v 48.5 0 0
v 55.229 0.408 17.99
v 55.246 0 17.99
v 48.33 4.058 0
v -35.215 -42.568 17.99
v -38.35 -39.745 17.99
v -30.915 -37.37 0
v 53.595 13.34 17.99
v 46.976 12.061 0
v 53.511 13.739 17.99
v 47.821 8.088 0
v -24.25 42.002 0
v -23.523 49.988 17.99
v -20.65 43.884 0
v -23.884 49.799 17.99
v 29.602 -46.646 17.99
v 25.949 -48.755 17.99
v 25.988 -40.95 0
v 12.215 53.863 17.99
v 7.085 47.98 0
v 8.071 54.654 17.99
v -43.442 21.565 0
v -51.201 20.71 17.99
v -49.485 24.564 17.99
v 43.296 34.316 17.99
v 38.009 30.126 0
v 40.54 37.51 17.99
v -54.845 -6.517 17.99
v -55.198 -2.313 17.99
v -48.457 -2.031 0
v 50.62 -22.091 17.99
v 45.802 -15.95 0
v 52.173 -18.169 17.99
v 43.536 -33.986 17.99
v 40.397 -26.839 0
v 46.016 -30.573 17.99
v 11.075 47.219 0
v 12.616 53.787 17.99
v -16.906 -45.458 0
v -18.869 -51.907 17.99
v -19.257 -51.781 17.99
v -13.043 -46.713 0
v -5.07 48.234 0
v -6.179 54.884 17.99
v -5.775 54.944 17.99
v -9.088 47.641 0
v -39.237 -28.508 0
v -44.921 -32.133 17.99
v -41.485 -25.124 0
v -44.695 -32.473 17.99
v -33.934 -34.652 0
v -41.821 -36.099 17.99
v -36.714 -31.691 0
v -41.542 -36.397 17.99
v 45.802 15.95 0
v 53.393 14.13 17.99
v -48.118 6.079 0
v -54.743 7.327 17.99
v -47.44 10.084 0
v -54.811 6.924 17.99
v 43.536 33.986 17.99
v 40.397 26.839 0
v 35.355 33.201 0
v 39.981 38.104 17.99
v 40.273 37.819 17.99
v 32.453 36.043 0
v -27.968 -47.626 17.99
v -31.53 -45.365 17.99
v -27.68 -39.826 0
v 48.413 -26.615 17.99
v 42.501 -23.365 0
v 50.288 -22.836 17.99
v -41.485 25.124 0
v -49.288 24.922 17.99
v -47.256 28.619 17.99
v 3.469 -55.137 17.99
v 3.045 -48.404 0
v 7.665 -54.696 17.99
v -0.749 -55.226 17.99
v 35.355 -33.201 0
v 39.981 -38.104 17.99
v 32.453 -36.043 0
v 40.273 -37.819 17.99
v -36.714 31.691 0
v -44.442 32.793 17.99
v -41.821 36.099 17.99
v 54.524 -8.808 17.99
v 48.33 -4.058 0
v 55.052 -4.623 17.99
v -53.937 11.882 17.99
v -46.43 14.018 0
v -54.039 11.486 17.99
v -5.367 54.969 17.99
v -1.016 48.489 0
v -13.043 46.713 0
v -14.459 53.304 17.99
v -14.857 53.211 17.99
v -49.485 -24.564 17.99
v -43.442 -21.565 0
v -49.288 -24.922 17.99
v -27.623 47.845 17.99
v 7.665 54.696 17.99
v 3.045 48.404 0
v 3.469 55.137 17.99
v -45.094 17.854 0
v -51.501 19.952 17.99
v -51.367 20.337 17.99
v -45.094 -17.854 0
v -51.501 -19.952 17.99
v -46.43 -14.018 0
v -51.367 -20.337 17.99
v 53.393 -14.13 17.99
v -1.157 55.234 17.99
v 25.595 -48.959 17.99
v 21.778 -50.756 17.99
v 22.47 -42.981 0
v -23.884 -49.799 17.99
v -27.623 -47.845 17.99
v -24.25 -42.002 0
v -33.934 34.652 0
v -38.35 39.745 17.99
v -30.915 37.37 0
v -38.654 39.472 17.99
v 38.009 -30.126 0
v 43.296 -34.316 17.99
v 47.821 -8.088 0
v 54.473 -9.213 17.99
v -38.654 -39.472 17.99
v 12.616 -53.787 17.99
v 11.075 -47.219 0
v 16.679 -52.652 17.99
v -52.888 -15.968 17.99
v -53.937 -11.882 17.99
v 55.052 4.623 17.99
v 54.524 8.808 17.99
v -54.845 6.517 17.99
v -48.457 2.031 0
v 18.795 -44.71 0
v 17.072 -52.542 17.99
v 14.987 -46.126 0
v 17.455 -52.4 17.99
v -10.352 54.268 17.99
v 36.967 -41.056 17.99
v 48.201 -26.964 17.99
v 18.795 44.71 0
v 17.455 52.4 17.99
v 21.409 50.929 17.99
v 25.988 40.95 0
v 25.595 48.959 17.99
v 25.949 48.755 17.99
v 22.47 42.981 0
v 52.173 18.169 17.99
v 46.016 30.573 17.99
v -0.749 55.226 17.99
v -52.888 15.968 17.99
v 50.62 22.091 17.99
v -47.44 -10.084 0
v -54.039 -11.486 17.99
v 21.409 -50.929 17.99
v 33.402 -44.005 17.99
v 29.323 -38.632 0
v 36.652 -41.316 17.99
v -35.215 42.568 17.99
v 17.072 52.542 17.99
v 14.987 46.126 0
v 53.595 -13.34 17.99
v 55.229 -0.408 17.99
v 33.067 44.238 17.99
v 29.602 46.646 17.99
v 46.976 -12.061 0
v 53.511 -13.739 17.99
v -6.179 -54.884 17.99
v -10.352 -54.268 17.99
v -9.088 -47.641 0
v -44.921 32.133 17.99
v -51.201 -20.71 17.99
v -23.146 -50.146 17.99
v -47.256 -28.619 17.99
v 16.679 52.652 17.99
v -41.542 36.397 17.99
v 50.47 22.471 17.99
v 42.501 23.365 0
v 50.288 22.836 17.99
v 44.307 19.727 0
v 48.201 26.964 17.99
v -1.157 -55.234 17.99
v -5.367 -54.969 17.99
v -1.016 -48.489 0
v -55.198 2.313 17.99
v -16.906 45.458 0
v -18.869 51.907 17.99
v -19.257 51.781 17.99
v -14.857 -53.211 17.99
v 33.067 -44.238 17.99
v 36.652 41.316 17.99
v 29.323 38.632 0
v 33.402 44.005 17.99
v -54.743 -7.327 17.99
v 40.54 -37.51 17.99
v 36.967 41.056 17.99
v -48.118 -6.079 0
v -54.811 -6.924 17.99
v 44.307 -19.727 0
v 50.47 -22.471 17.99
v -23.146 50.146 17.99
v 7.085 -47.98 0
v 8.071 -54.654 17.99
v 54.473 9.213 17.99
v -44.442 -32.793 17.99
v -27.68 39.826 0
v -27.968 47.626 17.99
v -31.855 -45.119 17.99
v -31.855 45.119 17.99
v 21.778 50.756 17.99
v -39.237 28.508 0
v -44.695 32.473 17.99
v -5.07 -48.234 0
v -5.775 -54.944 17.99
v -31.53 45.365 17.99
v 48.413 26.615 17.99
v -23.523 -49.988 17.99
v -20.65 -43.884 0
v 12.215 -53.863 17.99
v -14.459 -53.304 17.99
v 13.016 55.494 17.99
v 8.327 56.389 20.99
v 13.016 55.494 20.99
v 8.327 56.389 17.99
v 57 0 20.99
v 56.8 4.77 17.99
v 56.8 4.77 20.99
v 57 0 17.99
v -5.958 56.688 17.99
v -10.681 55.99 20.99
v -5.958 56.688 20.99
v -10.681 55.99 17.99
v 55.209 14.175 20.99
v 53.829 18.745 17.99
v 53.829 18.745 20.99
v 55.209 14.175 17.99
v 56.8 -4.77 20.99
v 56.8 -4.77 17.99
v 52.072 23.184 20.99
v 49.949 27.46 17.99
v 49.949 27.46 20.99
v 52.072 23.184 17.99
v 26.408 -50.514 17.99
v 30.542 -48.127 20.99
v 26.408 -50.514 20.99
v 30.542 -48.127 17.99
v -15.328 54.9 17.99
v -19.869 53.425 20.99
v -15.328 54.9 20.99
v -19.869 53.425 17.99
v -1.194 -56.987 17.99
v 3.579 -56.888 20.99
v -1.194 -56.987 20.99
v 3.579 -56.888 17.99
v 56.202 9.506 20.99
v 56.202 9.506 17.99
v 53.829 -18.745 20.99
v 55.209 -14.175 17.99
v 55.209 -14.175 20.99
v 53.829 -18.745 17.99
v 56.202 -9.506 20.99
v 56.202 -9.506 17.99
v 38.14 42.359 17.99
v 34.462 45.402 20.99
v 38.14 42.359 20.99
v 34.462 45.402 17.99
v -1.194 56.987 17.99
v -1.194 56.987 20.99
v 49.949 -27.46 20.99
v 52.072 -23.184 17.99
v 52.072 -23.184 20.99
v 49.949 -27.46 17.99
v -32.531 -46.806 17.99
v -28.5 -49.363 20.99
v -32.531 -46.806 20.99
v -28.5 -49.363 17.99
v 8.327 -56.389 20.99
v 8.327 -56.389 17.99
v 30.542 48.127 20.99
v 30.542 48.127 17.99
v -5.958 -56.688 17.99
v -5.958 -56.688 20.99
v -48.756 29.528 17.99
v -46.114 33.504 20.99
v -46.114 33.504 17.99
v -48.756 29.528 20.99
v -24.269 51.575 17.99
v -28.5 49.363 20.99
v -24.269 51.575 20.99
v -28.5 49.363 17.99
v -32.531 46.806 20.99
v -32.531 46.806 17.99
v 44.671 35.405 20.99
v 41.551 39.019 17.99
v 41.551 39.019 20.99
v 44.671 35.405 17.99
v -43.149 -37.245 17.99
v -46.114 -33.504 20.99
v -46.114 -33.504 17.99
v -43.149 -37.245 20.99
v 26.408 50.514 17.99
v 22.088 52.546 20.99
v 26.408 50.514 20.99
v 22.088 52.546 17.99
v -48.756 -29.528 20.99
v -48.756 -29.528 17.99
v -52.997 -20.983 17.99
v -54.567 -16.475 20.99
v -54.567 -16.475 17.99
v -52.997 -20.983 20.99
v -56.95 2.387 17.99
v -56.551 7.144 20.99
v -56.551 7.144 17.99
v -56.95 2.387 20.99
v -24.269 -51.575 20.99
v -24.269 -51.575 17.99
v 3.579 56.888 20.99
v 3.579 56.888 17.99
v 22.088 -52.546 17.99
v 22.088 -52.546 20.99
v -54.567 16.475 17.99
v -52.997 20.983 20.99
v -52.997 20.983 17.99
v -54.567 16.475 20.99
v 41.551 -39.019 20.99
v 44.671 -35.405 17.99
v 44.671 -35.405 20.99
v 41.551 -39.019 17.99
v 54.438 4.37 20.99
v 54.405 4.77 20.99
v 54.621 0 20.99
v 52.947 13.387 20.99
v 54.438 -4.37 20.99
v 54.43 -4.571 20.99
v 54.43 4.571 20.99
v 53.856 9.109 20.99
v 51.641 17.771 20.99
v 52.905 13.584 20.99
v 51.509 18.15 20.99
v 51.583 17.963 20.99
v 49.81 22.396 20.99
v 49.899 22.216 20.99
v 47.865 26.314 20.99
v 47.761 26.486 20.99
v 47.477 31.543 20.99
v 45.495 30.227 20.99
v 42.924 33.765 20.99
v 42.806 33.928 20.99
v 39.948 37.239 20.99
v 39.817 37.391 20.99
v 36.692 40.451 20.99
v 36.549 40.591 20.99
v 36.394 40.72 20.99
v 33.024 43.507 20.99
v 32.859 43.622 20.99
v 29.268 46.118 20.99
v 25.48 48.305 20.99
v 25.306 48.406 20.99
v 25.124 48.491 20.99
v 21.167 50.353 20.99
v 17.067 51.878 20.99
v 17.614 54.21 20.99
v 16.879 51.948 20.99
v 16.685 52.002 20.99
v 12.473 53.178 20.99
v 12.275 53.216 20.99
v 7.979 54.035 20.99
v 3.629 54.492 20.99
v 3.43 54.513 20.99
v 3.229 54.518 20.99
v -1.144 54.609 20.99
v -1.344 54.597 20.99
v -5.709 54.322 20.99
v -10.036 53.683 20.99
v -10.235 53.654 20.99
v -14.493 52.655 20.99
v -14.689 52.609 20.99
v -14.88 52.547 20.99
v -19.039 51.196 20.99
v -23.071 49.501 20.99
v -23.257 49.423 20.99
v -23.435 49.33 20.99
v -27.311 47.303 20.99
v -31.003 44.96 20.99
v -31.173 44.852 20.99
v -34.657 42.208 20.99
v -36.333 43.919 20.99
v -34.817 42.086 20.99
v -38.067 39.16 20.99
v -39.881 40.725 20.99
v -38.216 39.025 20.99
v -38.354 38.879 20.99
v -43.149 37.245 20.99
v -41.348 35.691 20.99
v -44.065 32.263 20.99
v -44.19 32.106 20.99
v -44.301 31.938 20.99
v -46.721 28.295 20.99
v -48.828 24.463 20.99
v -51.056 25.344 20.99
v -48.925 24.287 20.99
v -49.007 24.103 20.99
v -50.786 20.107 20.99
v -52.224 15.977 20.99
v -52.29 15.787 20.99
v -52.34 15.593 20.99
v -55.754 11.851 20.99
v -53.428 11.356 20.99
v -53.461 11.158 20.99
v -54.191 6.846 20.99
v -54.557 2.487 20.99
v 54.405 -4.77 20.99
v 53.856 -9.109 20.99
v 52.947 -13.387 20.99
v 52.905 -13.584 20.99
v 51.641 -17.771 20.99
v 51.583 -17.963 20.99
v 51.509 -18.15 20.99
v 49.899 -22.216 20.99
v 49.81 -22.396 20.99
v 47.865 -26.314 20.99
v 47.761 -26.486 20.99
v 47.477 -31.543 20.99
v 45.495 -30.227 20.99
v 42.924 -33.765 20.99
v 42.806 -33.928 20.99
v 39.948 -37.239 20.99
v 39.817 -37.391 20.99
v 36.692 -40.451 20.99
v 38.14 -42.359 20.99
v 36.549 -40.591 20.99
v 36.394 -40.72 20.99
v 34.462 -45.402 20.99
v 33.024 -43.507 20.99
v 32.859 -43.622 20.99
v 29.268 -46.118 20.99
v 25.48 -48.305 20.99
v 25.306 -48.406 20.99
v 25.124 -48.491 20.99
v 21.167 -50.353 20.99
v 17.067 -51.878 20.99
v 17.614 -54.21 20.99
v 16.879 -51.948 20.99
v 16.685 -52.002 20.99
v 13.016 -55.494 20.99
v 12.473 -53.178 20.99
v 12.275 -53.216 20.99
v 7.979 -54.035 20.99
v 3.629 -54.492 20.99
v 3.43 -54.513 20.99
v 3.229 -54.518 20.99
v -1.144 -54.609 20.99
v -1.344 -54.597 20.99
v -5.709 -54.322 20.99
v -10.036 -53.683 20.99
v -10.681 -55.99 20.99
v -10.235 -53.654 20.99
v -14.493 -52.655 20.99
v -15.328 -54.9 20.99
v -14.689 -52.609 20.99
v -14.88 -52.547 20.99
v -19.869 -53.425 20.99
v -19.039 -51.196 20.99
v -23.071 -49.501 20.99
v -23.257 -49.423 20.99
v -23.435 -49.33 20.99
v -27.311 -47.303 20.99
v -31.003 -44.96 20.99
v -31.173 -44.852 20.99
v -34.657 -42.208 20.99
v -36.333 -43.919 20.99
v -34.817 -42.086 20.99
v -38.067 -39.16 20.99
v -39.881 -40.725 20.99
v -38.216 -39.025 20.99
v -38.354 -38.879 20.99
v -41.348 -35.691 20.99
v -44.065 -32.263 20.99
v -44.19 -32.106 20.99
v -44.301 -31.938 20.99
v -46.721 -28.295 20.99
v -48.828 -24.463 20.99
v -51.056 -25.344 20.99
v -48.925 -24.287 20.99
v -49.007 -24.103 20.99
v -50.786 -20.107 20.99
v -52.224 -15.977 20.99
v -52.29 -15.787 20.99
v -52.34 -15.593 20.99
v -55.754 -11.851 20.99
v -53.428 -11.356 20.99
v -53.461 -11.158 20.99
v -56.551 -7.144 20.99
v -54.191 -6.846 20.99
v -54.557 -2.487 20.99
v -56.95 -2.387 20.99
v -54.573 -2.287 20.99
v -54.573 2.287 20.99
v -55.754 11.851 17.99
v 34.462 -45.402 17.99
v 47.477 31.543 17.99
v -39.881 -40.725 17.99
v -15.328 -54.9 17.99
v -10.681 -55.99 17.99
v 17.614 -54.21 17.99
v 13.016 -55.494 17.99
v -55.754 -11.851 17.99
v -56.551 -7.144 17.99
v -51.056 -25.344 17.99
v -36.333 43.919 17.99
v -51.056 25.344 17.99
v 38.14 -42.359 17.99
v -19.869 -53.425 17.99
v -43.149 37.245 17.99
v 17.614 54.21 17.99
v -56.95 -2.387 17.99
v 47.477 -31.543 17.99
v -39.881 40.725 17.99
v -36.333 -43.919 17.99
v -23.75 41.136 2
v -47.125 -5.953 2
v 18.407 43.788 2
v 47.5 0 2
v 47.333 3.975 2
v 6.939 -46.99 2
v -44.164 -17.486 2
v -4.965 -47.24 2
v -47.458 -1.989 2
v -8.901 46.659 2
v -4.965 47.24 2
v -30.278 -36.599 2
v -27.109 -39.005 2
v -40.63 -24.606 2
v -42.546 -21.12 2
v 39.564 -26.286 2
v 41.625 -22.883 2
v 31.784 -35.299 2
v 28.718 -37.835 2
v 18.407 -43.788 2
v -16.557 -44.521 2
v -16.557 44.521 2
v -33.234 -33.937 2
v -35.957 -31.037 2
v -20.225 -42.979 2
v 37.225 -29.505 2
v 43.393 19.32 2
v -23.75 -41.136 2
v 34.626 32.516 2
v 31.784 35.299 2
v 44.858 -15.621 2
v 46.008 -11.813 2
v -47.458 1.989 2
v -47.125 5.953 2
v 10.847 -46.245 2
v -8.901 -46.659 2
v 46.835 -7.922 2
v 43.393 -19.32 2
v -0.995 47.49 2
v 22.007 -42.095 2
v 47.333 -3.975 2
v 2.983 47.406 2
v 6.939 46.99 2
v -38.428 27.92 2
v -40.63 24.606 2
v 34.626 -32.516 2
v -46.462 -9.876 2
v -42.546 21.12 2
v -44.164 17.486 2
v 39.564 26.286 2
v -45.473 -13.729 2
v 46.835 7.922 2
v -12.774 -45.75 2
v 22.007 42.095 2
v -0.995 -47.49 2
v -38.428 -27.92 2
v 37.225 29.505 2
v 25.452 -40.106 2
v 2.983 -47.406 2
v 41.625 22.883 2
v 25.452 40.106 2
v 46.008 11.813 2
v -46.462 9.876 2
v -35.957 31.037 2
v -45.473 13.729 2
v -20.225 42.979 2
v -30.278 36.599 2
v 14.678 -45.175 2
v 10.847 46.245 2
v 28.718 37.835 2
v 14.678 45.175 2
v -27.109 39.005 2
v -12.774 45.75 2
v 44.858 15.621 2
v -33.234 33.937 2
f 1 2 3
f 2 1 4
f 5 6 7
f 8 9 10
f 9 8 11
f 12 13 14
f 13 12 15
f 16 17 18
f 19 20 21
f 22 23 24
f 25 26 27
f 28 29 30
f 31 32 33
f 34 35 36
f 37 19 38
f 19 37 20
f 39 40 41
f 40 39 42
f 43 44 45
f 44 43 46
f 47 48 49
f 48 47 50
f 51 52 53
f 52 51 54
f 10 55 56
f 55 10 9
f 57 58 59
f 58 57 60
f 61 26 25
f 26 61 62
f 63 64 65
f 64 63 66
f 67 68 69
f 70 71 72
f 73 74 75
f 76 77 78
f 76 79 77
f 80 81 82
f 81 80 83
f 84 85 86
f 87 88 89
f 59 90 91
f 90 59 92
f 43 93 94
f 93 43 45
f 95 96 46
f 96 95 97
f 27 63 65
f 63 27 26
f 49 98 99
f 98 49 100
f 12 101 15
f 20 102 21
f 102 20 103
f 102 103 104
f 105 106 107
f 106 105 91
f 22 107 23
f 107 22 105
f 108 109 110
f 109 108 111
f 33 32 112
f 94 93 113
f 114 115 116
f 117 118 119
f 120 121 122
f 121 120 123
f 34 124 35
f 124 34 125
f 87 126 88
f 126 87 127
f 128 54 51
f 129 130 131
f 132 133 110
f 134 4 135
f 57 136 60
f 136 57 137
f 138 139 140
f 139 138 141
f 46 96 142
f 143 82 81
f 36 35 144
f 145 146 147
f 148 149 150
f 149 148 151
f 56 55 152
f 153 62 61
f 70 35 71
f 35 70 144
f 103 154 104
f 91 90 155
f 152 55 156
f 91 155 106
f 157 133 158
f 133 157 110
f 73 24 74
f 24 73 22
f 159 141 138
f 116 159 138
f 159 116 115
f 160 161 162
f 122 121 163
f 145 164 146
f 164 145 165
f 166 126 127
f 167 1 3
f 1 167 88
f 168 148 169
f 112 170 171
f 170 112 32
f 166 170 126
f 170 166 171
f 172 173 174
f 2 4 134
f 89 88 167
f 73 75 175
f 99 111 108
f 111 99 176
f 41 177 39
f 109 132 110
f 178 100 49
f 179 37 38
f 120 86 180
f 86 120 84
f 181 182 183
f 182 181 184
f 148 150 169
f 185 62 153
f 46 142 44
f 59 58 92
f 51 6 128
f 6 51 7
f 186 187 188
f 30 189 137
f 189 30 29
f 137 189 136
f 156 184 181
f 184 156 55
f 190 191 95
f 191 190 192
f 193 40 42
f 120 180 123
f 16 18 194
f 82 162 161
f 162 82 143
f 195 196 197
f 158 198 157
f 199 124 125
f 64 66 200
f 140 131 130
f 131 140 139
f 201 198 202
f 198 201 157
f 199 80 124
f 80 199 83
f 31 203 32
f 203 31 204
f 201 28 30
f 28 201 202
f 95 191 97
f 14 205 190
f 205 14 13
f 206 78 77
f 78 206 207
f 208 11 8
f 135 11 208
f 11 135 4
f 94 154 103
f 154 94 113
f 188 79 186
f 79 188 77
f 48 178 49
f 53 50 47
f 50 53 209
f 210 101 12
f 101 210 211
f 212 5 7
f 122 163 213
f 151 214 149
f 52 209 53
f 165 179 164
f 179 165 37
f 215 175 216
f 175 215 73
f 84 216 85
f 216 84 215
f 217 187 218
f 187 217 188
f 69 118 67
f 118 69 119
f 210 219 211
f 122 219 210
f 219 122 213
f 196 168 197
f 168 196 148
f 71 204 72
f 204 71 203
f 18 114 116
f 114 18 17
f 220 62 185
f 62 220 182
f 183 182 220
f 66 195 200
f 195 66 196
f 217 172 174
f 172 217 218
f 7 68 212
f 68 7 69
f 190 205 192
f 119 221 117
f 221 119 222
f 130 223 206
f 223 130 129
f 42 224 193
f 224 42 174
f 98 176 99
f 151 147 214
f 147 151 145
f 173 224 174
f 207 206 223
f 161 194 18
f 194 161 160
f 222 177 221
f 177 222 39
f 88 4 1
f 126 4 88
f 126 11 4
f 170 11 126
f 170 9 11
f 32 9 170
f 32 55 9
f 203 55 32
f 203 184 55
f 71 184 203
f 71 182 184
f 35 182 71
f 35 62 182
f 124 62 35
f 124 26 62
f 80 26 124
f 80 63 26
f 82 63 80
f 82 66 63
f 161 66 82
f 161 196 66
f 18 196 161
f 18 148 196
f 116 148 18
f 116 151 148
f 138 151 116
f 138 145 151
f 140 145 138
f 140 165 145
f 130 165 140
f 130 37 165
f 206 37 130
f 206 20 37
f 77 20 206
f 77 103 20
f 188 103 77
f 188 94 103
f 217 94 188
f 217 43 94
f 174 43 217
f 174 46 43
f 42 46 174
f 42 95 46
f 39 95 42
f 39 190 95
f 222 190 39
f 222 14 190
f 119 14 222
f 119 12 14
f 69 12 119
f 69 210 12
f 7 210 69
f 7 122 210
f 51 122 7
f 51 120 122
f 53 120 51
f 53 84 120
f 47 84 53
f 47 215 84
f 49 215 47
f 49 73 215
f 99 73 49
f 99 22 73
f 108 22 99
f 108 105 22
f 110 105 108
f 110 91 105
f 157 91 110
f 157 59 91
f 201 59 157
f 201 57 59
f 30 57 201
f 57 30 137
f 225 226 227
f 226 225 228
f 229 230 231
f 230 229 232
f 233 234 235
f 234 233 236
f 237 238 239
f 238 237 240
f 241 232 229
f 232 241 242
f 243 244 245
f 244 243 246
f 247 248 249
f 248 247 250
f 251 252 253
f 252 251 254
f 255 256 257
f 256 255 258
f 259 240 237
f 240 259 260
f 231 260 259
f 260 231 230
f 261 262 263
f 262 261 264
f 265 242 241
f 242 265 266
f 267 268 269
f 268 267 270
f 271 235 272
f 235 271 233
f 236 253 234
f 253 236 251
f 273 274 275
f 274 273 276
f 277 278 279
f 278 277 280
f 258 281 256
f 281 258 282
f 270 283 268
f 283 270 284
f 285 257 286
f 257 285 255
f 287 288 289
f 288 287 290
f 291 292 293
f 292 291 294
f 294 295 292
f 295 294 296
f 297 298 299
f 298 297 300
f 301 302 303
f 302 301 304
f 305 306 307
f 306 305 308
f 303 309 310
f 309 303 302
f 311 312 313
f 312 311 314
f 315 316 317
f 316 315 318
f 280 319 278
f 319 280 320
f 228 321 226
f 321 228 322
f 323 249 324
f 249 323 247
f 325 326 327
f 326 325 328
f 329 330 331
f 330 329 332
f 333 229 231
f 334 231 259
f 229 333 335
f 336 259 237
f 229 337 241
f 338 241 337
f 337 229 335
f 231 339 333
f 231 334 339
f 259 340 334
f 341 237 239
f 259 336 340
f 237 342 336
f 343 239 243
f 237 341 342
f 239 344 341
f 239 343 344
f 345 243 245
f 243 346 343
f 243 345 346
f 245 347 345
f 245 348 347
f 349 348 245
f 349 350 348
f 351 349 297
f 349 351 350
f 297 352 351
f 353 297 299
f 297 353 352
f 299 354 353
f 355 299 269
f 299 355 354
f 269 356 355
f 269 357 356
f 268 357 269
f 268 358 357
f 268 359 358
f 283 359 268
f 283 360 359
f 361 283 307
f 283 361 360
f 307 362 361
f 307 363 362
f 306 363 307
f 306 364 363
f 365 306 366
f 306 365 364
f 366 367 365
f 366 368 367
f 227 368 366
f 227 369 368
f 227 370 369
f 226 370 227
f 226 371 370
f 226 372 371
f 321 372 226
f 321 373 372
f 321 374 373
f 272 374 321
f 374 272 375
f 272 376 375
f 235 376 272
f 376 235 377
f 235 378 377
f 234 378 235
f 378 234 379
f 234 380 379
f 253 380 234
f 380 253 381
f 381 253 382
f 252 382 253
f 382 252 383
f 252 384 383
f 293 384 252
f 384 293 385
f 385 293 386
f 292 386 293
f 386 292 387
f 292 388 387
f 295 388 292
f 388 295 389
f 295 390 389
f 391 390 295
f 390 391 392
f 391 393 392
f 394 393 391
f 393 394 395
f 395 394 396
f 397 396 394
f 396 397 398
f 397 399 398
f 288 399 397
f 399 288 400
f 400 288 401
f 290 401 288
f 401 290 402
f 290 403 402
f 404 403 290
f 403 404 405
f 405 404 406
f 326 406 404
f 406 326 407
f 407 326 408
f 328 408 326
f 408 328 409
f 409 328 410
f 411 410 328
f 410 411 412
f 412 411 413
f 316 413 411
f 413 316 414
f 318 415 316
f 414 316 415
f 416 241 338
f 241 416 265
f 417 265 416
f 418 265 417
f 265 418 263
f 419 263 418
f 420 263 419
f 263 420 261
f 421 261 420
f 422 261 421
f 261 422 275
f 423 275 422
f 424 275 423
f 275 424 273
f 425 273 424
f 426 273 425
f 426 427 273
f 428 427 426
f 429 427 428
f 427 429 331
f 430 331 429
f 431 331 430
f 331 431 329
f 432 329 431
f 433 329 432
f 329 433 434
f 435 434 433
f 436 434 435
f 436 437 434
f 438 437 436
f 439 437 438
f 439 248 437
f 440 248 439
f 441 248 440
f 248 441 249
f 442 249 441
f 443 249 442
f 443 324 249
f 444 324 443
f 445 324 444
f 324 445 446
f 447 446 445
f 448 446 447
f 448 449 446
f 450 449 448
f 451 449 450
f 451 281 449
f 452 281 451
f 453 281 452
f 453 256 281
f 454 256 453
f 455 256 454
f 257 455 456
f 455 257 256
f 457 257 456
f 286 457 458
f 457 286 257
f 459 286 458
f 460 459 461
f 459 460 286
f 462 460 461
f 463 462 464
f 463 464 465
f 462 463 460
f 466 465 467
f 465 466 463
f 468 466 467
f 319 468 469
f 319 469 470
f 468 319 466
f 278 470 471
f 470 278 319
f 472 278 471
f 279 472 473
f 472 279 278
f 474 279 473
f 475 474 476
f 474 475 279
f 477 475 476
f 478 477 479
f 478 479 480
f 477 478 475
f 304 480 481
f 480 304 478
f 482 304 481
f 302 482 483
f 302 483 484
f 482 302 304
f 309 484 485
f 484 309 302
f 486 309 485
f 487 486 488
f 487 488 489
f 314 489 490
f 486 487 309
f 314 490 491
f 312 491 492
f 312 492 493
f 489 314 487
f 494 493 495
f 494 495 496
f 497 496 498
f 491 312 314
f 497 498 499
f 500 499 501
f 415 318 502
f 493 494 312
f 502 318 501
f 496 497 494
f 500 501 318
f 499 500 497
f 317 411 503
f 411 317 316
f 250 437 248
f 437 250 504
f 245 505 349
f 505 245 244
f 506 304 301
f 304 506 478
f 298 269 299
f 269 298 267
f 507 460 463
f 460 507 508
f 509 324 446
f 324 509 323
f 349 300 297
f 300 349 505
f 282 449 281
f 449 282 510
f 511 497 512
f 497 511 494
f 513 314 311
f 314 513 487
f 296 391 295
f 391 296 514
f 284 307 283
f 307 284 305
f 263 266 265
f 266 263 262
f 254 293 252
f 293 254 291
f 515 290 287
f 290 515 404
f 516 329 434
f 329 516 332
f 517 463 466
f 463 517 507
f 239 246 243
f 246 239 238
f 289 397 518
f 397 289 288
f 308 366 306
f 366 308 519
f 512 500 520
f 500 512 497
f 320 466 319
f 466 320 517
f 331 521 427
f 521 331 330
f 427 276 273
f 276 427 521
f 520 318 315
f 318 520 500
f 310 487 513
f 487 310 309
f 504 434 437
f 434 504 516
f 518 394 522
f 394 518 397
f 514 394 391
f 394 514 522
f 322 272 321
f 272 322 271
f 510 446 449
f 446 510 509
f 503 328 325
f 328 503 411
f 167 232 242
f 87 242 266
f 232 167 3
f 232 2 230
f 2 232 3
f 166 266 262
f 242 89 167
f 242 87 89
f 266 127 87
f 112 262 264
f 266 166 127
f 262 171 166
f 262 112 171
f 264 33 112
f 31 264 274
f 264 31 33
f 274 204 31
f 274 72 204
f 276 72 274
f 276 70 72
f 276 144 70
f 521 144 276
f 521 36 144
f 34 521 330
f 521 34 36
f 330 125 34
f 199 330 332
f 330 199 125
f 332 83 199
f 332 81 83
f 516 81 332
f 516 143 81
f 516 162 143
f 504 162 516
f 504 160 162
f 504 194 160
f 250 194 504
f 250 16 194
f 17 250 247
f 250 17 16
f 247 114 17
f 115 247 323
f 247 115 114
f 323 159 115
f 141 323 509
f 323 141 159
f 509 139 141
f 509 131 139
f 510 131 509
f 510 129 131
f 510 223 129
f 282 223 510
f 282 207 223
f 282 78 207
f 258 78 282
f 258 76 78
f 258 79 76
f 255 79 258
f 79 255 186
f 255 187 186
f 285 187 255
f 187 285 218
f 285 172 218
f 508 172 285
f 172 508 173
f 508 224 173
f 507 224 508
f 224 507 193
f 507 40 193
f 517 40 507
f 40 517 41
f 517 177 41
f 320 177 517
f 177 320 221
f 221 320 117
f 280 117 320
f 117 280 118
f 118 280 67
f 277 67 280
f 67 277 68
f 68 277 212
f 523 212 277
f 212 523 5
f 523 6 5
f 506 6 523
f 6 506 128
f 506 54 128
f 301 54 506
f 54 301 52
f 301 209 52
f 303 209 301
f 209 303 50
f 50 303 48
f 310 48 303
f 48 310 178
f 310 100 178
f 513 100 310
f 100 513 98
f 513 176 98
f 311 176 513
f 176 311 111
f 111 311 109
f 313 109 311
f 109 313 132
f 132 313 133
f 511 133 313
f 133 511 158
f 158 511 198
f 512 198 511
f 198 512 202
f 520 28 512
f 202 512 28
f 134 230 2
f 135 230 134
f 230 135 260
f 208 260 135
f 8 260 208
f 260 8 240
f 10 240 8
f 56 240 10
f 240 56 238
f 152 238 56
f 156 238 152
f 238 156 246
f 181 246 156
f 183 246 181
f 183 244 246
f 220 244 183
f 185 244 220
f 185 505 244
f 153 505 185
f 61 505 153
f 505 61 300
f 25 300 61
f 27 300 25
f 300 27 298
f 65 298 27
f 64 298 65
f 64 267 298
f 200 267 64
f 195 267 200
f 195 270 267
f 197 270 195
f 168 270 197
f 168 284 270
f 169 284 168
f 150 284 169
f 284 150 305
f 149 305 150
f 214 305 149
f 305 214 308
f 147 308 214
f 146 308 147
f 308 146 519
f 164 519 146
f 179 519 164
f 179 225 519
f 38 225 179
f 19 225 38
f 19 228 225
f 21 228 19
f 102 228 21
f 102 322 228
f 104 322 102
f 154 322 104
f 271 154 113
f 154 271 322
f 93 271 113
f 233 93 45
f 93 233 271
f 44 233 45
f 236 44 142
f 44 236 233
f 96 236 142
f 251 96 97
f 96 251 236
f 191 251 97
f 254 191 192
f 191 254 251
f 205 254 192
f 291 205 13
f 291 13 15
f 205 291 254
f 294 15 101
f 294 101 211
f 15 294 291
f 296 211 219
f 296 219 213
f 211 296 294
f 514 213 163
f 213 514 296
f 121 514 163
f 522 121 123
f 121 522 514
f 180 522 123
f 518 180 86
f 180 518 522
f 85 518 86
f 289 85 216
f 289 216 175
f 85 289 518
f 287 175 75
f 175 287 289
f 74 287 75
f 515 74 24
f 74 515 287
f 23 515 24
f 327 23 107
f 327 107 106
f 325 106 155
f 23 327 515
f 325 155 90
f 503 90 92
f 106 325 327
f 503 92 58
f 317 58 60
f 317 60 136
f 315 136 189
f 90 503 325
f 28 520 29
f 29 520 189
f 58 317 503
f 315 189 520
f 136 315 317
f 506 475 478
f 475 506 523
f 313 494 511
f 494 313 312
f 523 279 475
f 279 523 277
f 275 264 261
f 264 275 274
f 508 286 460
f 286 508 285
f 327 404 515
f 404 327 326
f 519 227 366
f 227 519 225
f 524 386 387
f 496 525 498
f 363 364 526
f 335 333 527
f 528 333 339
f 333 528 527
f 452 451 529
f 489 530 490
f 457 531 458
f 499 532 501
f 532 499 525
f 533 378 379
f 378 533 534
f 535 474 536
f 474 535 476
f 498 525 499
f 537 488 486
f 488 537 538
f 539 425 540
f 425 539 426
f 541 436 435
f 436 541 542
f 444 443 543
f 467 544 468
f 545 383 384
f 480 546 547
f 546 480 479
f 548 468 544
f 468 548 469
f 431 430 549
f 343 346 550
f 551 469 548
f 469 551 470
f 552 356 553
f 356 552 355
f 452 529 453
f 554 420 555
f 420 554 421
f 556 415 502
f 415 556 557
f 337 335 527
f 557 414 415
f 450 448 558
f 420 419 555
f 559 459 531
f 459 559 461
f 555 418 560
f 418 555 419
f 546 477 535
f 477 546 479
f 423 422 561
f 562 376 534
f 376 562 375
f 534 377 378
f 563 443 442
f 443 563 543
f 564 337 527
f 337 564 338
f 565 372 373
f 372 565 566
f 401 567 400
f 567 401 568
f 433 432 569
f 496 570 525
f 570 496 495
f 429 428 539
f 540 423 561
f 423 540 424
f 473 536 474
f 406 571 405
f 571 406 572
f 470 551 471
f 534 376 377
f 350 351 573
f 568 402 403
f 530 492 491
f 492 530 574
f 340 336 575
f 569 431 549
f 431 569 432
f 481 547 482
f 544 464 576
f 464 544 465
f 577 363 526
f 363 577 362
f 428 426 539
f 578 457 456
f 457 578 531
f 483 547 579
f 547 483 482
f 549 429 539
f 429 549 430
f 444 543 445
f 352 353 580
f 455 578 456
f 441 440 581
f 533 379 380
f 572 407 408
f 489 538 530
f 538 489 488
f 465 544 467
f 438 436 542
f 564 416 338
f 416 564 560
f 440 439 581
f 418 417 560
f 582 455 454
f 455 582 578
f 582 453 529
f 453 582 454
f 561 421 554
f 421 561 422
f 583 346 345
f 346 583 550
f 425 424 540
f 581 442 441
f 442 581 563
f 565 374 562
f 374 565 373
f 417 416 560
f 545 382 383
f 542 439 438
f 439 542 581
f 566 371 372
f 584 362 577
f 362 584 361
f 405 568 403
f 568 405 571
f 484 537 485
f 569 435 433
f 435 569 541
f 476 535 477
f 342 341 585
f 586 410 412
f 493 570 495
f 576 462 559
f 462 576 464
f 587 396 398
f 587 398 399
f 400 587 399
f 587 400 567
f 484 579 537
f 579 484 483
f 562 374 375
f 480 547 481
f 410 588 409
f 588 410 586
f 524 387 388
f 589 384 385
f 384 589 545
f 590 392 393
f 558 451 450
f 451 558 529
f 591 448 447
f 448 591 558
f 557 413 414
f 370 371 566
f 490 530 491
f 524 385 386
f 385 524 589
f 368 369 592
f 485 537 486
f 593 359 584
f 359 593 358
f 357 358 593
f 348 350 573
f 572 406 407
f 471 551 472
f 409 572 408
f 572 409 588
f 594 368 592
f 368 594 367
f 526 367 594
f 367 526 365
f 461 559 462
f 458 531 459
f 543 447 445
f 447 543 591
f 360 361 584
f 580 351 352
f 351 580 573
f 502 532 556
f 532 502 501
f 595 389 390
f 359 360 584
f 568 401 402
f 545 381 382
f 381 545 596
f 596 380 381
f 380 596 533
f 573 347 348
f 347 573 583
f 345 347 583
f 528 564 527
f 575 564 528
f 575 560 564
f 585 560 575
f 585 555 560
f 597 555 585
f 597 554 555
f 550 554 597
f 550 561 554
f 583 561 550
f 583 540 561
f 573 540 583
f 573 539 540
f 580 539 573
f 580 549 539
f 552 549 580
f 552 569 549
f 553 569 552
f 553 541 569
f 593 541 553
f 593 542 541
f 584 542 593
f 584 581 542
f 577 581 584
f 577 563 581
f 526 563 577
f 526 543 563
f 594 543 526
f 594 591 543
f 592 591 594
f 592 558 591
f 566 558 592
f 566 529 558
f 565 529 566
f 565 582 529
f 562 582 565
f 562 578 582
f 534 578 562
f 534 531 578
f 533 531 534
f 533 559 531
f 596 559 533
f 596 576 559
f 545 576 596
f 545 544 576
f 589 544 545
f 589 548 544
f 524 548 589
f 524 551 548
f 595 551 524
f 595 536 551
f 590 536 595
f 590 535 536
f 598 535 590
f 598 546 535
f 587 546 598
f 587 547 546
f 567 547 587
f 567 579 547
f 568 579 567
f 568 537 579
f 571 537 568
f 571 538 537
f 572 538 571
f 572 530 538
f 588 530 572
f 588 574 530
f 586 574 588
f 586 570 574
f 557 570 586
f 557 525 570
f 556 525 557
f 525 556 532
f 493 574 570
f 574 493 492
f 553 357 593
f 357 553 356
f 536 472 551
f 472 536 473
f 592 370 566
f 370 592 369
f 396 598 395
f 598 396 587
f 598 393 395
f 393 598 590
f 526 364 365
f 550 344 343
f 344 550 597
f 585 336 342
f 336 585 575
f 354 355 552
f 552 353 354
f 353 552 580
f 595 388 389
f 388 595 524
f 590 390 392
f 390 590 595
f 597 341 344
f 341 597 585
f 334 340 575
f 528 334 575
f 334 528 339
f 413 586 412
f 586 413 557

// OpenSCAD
$fn=75;

DiametroArriba=110; // Boca del plato en mm
DiametroAbajo=95;   // Base del plato en mm
Altura=20;          // Altura del plato en mm
Espesor=2;          // Espesor de las paredes del plato en mm
Aro=2;              // Tamaño del aro del plato en mm


module Platito(DiametroMayor=DiametroArriba, DiametroMenor=DiametroAbajo, Alto=Altura, Espesor=Espesor){

difference(){
    union(){
        cylinder(h=Alto, r2=DiametroMayor/2+Espesor/2, r1=DiametroMenor/2+Espesor/2);
        translate([0,0,Alto-(Aro+0.01)])cylinder(h=3, r=DiametroMayor/2+Aro);
    }        
    translate([0,0,Espesor]) cylinder(h=Alto, r1=DiametroMenor/2, r2=DiametroMayor/2);
    };
}

Platito(DiametroMayor=DiametroArriba, DiametroMenor=DiametroAbajo, Alto=Altura, Espesor=Espesor);
